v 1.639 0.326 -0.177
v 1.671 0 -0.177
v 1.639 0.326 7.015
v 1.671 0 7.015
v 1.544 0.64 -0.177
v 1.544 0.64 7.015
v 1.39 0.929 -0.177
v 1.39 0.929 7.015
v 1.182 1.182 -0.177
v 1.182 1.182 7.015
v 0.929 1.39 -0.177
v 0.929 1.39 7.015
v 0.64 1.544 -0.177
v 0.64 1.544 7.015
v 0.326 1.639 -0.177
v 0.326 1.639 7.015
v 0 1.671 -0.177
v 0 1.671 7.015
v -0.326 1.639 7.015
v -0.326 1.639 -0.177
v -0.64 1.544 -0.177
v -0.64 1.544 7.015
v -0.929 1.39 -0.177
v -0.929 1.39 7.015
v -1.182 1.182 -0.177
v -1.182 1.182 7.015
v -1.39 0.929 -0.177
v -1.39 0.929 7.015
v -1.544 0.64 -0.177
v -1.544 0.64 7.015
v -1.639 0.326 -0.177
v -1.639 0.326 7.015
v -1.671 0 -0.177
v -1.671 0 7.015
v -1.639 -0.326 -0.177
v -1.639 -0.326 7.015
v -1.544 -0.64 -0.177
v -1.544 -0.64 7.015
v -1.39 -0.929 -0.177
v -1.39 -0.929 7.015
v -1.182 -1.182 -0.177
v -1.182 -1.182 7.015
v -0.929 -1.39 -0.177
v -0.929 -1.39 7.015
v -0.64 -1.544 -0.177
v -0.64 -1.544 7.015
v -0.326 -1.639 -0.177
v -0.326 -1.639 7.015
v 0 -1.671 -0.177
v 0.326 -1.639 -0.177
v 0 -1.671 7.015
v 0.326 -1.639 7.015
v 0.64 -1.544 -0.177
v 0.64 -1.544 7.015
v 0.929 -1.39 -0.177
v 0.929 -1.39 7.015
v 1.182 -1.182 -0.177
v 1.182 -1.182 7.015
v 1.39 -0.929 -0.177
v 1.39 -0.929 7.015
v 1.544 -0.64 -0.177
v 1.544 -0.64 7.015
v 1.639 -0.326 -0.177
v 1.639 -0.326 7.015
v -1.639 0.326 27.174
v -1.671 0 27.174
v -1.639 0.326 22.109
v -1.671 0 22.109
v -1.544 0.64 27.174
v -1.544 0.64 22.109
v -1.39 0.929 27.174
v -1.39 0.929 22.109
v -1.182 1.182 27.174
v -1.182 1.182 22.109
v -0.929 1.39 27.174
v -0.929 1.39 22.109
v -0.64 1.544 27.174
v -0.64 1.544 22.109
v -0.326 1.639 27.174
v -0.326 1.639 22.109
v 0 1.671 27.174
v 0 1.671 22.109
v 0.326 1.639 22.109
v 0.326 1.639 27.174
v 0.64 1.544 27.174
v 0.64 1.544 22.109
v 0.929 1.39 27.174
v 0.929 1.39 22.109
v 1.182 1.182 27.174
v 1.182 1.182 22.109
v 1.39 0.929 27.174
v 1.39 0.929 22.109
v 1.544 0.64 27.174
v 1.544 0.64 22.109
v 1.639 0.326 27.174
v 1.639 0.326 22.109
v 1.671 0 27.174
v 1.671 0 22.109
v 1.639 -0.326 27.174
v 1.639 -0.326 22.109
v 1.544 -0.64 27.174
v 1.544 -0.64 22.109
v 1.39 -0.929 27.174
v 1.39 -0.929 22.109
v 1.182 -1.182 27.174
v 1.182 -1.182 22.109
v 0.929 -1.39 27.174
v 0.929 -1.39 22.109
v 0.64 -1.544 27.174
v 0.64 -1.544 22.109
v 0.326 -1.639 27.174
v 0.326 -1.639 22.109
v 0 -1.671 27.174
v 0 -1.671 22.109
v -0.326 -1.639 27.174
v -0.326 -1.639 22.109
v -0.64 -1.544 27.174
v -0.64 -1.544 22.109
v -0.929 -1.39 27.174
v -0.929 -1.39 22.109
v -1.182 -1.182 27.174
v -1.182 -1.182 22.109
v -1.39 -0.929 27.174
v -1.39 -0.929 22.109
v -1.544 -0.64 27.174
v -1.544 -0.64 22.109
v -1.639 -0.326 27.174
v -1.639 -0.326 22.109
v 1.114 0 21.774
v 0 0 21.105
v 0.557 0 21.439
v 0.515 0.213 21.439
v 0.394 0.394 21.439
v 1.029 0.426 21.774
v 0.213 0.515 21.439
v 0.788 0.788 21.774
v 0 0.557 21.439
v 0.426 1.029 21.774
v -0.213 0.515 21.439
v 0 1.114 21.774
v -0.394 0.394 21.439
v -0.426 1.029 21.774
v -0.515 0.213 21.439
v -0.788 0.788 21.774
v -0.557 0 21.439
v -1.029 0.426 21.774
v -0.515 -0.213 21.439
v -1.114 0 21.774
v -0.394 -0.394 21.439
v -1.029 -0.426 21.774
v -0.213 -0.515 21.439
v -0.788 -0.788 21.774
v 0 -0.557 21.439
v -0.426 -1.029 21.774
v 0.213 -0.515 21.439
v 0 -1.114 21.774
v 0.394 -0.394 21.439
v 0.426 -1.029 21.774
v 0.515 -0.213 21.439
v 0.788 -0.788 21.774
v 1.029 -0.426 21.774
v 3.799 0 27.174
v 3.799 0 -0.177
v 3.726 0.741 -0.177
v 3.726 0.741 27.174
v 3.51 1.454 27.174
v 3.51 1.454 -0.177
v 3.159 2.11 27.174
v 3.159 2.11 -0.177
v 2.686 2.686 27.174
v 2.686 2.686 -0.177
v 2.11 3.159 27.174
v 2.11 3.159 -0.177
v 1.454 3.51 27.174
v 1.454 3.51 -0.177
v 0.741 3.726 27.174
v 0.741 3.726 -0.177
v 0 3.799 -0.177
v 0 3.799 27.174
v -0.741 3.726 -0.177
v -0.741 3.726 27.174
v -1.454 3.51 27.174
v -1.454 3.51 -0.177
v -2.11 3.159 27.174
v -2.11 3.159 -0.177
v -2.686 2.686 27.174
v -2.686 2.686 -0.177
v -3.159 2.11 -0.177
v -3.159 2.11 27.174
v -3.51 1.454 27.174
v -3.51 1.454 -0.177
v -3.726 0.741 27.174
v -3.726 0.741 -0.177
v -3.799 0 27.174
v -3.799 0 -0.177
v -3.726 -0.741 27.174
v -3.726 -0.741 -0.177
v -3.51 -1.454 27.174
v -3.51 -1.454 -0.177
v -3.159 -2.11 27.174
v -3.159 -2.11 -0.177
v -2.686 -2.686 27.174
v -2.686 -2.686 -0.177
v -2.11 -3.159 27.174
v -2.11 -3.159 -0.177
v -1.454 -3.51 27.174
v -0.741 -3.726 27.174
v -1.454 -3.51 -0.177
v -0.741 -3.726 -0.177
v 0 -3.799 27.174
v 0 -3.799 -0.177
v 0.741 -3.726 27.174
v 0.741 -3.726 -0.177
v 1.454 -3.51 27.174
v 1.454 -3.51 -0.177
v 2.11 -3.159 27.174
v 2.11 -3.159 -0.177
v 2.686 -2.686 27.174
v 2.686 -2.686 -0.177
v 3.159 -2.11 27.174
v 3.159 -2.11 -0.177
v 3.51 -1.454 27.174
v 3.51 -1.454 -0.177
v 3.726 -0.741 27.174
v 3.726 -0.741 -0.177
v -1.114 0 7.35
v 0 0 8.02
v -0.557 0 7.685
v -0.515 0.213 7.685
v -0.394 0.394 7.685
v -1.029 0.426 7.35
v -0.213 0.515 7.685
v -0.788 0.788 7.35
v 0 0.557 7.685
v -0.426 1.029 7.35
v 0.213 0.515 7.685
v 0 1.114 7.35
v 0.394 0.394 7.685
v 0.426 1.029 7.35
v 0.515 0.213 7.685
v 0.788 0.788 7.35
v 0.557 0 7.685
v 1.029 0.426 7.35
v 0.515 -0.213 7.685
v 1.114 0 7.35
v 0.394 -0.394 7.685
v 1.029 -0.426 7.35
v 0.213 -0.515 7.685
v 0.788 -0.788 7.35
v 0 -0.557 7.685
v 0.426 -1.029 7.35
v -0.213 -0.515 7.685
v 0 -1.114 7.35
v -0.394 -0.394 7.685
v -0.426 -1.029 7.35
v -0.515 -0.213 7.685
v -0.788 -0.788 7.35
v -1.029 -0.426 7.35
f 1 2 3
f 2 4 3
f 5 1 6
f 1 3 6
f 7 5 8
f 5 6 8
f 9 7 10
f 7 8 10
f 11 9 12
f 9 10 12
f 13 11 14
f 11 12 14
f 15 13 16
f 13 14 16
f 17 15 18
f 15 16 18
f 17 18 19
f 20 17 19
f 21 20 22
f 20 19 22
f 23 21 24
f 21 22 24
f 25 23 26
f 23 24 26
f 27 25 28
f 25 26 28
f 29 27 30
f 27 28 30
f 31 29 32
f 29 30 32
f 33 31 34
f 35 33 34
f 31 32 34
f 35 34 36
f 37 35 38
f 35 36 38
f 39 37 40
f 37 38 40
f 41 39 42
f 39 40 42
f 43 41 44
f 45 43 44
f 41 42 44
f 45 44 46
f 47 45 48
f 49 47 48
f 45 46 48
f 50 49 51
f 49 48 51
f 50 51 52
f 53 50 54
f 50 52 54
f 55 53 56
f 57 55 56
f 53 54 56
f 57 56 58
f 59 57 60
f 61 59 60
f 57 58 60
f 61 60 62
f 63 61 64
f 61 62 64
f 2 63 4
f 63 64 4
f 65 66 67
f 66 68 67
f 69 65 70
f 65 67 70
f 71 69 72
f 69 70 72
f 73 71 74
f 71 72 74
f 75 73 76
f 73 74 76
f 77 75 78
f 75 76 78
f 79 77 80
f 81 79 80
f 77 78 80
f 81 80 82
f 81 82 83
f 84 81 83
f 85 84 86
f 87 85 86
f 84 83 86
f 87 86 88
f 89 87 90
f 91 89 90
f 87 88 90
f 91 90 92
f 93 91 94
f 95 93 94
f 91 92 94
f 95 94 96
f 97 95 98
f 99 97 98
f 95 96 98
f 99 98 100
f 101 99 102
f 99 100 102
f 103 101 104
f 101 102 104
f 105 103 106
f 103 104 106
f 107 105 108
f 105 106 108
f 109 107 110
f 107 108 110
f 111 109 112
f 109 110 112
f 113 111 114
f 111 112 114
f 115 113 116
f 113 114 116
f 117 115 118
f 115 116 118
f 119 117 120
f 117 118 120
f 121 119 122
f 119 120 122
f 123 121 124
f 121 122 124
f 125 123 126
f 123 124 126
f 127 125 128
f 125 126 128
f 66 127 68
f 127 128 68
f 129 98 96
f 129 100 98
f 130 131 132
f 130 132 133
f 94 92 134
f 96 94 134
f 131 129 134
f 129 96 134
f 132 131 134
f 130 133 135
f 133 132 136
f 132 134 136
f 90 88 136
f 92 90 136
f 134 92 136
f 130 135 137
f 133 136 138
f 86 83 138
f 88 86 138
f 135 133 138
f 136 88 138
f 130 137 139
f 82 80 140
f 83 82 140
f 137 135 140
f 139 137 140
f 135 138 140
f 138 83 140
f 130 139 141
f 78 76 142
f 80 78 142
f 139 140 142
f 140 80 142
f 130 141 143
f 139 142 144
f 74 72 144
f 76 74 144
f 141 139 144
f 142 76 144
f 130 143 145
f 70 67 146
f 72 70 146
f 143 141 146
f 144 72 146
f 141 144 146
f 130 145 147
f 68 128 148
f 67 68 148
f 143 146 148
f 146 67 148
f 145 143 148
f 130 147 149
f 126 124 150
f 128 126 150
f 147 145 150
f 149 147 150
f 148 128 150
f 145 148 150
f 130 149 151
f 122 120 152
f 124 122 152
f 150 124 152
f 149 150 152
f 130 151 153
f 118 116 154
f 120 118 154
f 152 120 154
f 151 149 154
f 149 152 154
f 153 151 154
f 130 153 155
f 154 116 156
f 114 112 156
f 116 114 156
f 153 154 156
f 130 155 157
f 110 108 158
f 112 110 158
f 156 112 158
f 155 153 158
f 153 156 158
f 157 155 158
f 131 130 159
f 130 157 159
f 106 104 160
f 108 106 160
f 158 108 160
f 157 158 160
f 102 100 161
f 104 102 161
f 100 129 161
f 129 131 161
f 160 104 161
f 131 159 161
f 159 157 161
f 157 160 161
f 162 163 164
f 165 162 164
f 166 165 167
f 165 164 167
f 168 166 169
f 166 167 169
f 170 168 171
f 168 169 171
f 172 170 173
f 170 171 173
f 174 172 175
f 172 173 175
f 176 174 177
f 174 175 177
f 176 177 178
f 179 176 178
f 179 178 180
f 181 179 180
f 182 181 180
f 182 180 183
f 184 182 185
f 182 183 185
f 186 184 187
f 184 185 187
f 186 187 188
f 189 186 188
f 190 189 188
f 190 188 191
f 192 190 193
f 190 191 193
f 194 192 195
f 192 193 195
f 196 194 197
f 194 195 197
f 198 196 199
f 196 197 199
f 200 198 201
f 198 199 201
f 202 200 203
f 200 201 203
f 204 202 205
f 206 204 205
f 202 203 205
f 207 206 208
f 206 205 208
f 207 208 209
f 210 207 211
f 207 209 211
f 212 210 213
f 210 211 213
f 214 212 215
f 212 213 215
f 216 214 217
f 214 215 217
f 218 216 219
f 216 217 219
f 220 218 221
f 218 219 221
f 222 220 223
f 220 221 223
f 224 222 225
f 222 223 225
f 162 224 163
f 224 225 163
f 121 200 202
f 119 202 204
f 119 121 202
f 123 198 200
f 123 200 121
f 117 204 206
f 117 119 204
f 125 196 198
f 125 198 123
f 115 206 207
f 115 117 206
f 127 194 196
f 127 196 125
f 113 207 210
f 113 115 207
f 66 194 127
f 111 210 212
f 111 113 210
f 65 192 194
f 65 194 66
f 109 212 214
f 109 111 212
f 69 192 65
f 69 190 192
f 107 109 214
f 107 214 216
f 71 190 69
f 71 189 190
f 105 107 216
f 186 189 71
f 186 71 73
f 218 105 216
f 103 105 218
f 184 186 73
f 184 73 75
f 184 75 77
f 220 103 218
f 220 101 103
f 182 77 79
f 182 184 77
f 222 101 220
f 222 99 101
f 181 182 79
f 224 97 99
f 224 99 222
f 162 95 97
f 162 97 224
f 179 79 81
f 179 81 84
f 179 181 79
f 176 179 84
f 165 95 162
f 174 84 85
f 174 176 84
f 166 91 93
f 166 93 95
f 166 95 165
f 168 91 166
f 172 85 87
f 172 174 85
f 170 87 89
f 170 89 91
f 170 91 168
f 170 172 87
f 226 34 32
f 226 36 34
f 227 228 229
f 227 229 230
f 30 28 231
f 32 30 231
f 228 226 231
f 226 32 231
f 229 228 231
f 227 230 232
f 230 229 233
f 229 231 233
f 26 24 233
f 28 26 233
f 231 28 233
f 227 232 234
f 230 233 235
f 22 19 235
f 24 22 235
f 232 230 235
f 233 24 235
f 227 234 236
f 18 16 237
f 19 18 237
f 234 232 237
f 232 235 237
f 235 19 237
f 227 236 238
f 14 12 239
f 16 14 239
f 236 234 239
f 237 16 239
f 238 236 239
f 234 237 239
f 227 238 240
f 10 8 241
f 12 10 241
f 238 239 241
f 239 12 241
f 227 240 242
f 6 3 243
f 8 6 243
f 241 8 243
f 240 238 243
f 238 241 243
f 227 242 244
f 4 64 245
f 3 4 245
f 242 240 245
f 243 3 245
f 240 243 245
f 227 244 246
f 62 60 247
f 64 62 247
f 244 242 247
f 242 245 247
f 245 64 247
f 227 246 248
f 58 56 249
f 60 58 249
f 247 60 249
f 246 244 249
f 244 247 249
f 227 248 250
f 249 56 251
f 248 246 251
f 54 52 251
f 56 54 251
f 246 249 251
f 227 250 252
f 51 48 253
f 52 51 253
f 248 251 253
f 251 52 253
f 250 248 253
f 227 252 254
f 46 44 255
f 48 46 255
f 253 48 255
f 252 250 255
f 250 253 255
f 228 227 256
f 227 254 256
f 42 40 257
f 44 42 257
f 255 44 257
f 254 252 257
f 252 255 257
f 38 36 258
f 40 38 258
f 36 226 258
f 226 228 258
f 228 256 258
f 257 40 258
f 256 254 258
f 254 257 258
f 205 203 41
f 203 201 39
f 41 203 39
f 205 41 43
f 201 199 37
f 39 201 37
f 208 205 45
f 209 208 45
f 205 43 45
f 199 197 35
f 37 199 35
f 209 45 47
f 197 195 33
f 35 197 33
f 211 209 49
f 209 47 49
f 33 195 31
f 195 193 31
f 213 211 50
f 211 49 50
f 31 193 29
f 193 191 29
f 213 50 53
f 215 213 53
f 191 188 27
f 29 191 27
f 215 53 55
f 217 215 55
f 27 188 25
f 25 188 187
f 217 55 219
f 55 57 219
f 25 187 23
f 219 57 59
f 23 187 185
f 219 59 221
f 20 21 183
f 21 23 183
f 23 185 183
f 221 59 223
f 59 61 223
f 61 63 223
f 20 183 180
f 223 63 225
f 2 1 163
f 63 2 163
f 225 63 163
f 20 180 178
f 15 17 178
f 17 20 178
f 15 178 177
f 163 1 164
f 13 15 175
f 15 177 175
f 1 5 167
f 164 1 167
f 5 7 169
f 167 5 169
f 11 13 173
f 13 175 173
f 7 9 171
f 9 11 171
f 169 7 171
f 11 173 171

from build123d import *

# Parameters (mm, degrees)
SKETCH1_R             = 3.75
BOSS_EXTRUDE1_DEPTH   = 27
M4_TAPPED_HOLE1_D     = 3.3
M4_TAPPED_HOLE1_DEPTH = 5
M4_TAPPED_HOLE1_TIP   = 0.991420021
M4_TAPPED_HOLE2_D     = 3.3
M4_TAPPED_HOLE2_DEPTH = 7.1
M4_TAPPED_HOLE2_TIP   = 0.991420021
SCALE1_SCALE          = 1.013


with BuildPart() as part:
    # Sketch1 → Boss-Extrude1 (new body)
    with BuildSketch(Plane.XY):
        Circle(SKETCH1_R)
    extrude(amount=BOSS_EXTRUDE1_DEPTH)

    # M4 Tapped Hole1
    with Locations(Plane.XY.offset(27)):
        with Locations((0, 0)):
            Hole(M4_TAPPED_HOLE1_D / 2, depth=M4_TAPPED_HOLE1_DEPTH)
            with Locations((0, 0, -(M4_TAPPED_HOLE1_DEPTH + M4_TAPPED_HOLE1_TIP / 2))):  # 118° drill point
                Cone(0, M4_TAPPED_HOLE1_D / 2, M4_TAPPED_HOLE1_TIP, mode=Mode.SUBTRACT)

    # M4 Tapped Hole2
    with Locations(Plane(origin=(0, 0, 0), x_dir=(-1, 0, 0), z_dir=(0, 0, -1))):
        with Locations((0, 0)):
            Hole(M4_TAPPED_HOLE2_D / 2, depth=M4_TAPPED_HOLE2_DEPTH)
            with Locations((0, 0, -(M4_TAPPED_HOLE2_DEPTH + M4_TAPPED_HOLE2_TIP / 2))):  # 118° drill point
                Cone(0, M4_TAPPED_HOLE2_D / 2, M4_TAPPED_HOLE2_TIP, mode=Mode.SUBTRACT)


with BuildPart() as part_1:
    # Scale1: scaled about (0, 0, 13.618001469)
    add(part.part.scale(SCALE1_SCALE).moved(Location((0, 0, -0.177034019))))


solid = part_1.part
